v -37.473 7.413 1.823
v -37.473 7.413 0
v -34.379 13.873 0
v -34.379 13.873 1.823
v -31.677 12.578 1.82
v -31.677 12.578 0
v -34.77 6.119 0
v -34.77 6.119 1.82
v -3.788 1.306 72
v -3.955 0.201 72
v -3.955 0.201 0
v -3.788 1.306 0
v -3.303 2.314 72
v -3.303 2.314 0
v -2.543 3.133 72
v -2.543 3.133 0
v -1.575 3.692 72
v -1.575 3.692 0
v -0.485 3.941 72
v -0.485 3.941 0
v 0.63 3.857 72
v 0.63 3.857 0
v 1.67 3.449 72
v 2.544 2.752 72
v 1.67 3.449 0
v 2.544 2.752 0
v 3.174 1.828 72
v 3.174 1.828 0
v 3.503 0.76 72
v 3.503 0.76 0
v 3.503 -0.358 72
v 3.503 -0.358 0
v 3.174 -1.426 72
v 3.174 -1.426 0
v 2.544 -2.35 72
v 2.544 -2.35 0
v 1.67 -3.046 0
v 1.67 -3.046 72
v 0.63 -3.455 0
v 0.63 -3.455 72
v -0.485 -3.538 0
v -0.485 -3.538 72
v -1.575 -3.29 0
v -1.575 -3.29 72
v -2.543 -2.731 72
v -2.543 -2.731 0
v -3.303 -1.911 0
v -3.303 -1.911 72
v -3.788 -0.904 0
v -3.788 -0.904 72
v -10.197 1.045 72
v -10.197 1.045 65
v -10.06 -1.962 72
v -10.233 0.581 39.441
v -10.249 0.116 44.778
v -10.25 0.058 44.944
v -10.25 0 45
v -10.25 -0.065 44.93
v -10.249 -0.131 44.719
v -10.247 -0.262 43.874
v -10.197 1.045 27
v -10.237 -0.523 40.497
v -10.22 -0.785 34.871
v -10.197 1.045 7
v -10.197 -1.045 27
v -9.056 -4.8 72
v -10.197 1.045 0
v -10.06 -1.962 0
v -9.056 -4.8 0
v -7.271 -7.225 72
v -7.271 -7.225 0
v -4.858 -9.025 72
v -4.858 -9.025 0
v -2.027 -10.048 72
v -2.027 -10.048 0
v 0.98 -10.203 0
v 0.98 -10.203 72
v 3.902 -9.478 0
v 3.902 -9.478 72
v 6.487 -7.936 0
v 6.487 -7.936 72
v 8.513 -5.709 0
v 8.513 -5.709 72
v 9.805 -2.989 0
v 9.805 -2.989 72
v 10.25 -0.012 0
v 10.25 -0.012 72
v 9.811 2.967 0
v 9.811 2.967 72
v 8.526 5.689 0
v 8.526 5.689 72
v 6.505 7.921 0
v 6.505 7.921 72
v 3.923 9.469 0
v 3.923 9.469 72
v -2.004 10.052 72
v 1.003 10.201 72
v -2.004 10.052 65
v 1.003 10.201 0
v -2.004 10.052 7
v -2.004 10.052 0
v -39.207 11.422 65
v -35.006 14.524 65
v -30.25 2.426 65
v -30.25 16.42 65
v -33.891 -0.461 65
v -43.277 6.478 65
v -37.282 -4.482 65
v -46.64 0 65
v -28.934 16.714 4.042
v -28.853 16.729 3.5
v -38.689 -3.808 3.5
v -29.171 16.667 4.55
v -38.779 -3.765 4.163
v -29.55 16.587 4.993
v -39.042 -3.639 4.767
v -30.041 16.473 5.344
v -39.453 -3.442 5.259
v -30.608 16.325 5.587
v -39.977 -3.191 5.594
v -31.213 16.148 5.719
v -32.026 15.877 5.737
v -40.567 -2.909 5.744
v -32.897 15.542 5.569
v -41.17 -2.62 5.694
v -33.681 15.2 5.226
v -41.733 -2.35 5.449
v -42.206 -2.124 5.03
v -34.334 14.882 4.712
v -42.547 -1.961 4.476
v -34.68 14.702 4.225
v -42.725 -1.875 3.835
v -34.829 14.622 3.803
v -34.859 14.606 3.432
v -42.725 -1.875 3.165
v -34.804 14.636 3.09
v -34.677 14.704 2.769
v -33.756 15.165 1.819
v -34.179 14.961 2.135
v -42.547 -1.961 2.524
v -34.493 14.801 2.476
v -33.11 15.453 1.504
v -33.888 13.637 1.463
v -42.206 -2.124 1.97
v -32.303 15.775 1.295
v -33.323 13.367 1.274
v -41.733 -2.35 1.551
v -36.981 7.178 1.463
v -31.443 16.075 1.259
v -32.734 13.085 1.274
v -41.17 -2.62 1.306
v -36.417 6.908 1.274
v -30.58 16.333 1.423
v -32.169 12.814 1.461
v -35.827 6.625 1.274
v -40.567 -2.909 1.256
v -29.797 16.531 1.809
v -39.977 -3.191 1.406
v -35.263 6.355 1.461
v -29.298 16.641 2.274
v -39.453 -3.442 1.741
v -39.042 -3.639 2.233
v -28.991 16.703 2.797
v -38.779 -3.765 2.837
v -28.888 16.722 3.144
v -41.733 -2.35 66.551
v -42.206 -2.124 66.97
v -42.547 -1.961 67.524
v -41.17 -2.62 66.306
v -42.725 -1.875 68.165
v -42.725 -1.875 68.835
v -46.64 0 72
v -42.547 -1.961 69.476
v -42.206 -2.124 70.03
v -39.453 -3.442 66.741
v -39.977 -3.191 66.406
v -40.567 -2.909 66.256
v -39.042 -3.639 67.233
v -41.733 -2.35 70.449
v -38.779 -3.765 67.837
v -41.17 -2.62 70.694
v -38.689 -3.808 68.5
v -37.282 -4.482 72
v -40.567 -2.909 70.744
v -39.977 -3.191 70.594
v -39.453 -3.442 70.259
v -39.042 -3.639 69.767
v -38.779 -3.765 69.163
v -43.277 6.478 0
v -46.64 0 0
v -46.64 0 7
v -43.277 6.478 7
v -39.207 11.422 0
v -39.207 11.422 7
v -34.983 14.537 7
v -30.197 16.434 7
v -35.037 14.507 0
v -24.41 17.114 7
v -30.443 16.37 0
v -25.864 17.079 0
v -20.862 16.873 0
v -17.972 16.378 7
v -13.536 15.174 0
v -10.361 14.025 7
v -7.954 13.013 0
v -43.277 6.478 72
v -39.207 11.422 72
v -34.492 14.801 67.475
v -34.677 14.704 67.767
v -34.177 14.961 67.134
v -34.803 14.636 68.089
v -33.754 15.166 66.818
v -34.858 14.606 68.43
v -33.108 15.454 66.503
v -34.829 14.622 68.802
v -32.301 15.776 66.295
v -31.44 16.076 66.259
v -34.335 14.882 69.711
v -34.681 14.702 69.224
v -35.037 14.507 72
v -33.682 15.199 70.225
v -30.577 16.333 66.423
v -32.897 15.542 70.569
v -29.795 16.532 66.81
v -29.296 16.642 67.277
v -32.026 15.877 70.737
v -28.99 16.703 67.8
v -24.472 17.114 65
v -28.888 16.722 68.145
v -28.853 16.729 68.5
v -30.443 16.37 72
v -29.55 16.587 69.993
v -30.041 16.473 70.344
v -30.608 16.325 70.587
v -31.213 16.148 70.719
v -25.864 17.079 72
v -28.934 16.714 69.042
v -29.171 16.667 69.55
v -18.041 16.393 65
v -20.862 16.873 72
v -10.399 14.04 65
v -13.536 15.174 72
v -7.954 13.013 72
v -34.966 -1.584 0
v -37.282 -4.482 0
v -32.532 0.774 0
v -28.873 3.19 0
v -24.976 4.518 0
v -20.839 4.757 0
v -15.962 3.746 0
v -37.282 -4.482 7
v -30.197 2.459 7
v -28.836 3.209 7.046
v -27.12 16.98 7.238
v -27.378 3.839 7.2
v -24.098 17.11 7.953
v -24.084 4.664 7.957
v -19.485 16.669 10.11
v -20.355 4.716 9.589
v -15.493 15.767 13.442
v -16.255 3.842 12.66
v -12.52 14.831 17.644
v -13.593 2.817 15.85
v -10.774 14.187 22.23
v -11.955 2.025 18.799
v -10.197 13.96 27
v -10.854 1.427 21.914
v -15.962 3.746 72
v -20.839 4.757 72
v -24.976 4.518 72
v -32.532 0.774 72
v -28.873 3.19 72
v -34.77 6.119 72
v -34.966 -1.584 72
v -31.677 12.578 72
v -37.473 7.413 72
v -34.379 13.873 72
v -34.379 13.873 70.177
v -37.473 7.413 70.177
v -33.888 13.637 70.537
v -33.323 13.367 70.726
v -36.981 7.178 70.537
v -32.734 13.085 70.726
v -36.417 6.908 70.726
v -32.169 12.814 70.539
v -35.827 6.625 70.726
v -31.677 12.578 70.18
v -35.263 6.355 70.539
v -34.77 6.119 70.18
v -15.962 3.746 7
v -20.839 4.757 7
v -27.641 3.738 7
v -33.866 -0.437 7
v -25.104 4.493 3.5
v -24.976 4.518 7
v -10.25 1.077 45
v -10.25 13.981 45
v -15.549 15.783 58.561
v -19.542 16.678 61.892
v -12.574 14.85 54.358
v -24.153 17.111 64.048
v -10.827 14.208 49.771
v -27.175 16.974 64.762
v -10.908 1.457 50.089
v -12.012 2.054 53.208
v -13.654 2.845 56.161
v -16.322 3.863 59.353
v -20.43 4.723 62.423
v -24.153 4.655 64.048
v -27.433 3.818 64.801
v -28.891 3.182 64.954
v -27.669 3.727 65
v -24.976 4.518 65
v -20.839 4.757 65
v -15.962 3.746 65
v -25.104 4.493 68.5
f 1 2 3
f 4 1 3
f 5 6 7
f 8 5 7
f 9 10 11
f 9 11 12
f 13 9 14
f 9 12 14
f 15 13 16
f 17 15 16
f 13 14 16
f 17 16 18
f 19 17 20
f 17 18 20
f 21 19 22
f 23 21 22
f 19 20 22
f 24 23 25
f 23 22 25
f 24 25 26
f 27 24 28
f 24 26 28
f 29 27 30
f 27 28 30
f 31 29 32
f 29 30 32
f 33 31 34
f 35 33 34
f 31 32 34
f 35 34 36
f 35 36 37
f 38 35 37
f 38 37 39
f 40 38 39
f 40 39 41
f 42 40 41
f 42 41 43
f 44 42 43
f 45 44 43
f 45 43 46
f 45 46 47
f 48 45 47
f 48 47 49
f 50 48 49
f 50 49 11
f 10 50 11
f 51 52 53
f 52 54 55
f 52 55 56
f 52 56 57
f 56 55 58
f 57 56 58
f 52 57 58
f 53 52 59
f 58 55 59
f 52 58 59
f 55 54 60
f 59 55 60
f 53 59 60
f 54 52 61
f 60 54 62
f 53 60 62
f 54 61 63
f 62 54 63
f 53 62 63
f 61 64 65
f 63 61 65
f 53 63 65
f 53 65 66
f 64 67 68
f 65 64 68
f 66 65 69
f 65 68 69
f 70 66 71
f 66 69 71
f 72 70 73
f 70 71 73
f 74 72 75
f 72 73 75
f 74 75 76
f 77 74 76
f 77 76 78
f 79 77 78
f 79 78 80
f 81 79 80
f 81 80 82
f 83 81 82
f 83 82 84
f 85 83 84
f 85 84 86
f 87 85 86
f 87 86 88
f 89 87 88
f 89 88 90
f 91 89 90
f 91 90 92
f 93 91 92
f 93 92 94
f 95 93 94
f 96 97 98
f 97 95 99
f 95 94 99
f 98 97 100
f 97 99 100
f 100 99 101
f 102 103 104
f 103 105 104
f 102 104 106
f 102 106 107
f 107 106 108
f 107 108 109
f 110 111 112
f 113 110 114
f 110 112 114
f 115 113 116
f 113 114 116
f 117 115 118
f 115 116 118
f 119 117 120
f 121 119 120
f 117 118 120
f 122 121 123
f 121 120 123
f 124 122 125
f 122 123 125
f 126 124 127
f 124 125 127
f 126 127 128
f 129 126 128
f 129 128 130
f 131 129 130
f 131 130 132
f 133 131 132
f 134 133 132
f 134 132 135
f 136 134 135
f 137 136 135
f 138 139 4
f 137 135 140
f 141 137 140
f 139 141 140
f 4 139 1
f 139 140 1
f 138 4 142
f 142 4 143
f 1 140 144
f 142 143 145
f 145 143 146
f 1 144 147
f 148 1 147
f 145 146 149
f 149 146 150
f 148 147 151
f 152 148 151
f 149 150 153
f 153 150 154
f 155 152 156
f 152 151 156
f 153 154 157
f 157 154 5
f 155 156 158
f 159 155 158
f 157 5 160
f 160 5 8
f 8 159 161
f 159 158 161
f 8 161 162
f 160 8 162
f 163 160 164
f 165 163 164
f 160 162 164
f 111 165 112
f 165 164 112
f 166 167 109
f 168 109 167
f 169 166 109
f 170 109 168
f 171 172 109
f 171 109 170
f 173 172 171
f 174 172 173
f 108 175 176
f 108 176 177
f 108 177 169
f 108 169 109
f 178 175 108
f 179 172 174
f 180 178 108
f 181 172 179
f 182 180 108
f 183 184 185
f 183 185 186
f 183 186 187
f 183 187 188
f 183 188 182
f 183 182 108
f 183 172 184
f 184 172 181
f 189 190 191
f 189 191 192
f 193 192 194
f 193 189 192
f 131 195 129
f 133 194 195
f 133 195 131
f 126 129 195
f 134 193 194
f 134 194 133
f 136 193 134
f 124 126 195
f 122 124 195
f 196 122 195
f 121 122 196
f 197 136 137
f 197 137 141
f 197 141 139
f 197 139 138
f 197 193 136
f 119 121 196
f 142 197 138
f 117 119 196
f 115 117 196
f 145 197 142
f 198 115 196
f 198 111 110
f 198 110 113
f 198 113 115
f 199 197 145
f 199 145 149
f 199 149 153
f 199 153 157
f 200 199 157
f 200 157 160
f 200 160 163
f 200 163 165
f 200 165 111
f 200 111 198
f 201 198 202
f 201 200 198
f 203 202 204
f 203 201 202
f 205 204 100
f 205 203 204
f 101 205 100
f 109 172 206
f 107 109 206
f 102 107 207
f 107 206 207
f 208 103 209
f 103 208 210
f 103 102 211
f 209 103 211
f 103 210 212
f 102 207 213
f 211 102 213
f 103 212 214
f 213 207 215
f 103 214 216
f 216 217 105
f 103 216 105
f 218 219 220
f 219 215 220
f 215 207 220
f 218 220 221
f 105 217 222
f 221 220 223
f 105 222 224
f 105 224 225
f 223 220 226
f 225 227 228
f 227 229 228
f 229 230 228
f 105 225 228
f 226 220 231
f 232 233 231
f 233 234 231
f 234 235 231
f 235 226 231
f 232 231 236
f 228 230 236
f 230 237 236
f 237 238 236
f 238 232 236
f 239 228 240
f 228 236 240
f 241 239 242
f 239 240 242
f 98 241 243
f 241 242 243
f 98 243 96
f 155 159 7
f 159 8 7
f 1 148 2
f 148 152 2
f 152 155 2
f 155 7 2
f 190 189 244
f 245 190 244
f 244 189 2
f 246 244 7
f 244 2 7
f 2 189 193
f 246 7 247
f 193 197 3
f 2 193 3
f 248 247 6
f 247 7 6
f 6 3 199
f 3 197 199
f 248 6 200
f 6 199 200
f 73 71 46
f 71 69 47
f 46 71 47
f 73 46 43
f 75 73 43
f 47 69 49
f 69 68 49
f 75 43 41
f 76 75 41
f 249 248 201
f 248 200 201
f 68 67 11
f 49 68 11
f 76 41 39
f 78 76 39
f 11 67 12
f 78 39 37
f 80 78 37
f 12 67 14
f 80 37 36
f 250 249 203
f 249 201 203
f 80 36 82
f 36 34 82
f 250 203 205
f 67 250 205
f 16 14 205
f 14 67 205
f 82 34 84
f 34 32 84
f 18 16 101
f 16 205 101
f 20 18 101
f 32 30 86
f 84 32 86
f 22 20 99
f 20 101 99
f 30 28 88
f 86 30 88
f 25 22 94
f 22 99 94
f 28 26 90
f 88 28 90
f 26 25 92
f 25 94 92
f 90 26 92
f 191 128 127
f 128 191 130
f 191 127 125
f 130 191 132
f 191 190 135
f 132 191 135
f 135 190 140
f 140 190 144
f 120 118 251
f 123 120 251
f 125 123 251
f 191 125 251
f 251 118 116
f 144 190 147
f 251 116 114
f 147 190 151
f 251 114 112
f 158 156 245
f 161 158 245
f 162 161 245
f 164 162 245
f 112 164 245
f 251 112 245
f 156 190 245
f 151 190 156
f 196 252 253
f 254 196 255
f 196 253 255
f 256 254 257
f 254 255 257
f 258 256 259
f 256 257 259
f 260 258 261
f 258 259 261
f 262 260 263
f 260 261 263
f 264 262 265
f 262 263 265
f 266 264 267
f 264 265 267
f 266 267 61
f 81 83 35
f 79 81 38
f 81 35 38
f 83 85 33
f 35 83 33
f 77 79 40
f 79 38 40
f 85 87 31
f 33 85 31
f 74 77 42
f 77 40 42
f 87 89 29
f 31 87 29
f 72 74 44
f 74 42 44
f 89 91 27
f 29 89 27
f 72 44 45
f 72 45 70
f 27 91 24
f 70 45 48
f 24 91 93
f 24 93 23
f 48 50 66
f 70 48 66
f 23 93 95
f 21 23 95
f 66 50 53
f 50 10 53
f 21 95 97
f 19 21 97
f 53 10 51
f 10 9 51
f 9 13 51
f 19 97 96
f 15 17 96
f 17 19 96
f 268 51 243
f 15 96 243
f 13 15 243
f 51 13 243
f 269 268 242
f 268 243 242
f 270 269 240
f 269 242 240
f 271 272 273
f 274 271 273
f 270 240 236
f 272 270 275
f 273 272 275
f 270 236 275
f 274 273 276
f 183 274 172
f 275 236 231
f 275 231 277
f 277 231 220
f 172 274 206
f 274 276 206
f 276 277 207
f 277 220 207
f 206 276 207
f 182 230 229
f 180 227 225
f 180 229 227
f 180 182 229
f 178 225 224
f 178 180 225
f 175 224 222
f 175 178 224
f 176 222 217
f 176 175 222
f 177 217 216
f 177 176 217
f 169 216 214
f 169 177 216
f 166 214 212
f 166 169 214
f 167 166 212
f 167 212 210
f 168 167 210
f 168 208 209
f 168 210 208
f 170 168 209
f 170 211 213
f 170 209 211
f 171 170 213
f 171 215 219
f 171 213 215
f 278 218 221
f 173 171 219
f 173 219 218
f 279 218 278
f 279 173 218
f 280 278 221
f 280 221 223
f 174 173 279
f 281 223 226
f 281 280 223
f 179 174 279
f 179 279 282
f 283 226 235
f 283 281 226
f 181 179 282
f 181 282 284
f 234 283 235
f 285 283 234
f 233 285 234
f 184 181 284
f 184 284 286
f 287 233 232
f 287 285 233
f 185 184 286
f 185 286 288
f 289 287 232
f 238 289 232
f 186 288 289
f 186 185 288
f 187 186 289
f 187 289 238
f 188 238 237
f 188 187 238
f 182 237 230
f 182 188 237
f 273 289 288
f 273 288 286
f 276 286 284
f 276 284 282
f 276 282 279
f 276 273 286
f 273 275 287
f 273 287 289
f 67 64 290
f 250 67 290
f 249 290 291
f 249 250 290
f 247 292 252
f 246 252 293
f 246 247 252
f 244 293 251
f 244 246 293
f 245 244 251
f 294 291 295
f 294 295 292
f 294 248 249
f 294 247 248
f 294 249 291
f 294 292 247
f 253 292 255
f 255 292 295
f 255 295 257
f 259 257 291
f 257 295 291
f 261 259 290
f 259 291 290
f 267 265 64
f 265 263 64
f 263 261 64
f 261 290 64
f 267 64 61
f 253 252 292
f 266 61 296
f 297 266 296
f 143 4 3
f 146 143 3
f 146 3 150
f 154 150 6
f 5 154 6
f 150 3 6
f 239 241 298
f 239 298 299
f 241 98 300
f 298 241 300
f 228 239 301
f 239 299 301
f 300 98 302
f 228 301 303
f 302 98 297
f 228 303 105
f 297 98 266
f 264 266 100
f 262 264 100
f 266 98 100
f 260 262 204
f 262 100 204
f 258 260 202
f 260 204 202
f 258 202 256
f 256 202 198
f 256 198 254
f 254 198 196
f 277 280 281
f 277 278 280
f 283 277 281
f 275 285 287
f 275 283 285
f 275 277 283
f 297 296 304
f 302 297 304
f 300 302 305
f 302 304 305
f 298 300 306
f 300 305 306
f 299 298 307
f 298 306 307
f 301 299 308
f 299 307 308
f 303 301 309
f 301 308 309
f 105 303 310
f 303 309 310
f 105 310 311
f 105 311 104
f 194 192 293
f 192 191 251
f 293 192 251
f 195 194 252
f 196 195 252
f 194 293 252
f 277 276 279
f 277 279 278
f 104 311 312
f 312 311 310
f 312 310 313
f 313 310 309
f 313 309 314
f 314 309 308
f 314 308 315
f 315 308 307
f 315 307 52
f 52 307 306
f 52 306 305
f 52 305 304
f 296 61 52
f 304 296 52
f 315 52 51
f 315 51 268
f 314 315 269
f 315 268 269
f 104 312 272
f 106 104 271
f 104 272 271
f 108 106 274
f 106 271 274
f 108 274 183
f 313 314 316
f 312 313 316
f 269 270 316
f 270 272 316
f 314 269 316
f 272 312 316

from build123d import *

# Parameters (mm, degrees)
SKETCH1_R                = 10.25
BOSS_EXTRUDE1_DEPTH      = 7
SKETCH2_R                = 3.75
CUT_EXTRUDE1_DEPTH       = 2
BOSS_EXTRUDE3_START      = -7
BOSS_EXTRUDE3_DEPTH      = 7
SKETCH11_R               = 2.25
CUT_EXTRUDE3_DEPTH       = 30
CUT_EXTRUDE4_DEPTH       = 3
SKETCH15_R               = 10.25
BOSS_EXTRUDE4_DEPTH      = 65
BOSS_EXTRUDE5_DEPTH      = 58
CUT_EXTRUDE5_DEPTH       = 44
CUT_EXTRUDE5_DEPTH_BACK  = 34
BOSS_EXTRUDE6_DEPTH      = 15
BOSS_EXTRUDE6_DEPTH_BACK = 20
SKETCH20_R               = 10.25
SKETCH21_R               = 3.75
CUT_EXTRUDE6_DEPTH       = 92


with BuildPart() as part:
    # Sketch1 → Boss-Extrude1 (new body)
    with BuildSketch(Plane.XY):
        Circle(SKETCH1_R)
    extrude(amount=BOSS_EXTRUDE1_DEPTH)

    # Sketch2 → Cut-Extrude1 (cut)
    with BuildSketch(Plane(origin=(0, 0, 0), x_dir=(-1, 0, 0), z_dir=(0, 0, -1))):
        with Locations((0.204827132, 0.201115052)):
            Circle(SKETCH2_R)
    cut_extrude1 = extrude(amount=-CUT_EXTRUDE1_DEPTH, mode=Mode.SUBTRACT)

    # Sketch4 → Boss-Extrude3 (add)
    with BuildSketch(Plane.XY.offset(7).offset(BOSS_EXTRUDE3_START)):
        with BuildLine():
            add(Edge.make_bspline(
                [(-46.64048221, 0), (-34.962013149, 28.10744238), (-2.004119339, 10.052164228)],
                knots=[0, 0, 0, 1, 1, 1], degree=2))
            Line((-46.64048221, 0), (-37.28232369, -4.481971191))
            add(Edge.make_bspline(
                [(-10.196546661, 1.045435881), (-26.46828973, 10.703347347), (-37.28232369, -4.481971191)],
                knots=[0, 0, 0, 1, 1, 1], degree=2))
            ThreePointArc((-10.196546661, 1.045435881), (-7.58250299, 6.896966609), (-2.004119339, 10.052164228))
        make_face()
    boss_extrude3 = extrude(amount=BOSS_EXTRUDE3_DEPTH)

    # Sketch11 → Cut-Extrude3 (cut)
    with BuildSketch(Plane(origin=(-8.702296632, -18.170012234, 0), x_dir=(0, 0, 1), z_dir=(-0.4319519366403788, -0.9018966262452843, 0))):
        with Locations(Location((3.5, 35.498805819, 0), (0, 0, 270))):
            Circle(SKETCH11_R)
    cut_extrude3 = extrude(amount=-CUT_EXTRUDE3_DEPTH, mode=Mode.SUBTRACT)

    # Sketch13 → Cut-Extrude4 (cut)
    with BuildSketch(Plane(origin=(0, 0, 0), x_dir=(-1, 0, 0), z_dir=(0, 0, -1))):
        Polygon((34.379239122, 13.872575937), (31.676706965, 12.578232477), (34.770203183, 6.119148571), (37.47273534, 7.41349203), align=None)
    cut_extrude4 = extrude(amount=-CUT_EXTRUDE4_DEPTH, mode=Mode.SUBTRACT)

    # Sketch15 → Boss-Extrude4 (add)
    with BuildSketch(Plane.XY.offset(7)):
        with Locations(Location((0, 0, 0), (0, 0, 174.146009255))):
            Circle(SKETCH15_R)
    extrude(amount=BOSS_EXTRUDE4_DEPTH)

    # Mirror1: Cut-Extrude1, Boss-Extrude3, Cut-Extrude3, Cut-Extrude4 across plane
    add(cut_extrude1.mirror(Plane.XY.offset(36)), mode=Mode.SUBTRACT)
    add(boss_extrude3.mirror(Plane.XY.offset(36)))
    add(cut_extrude3.mirror(Plane.XY.offset(36)), mode=Mode.SUBTRACT)
    add(cut_extrude4.mirror(Plane.XY.offset(36)), mode=Mode.SUBTRACT)

    # Sketch18 → Boss-Extrude5 (add)
    with BuildSketch(Plane.XY.offset(7)):
        with BuildLine():
            Line((-46.64048221, 0), (-37.28232368, -4.481971176))
            add(Edge.make_bspline(
                [(-37.28232368, -4.481971176), (-26.468289723, 10.703347342), (-10.196546661, 1.045435881)],
                knots=[0, 0, 0, 1, 1, 1], degree=2))
            ThreePointArc((-10.196546661, 1.045435881), (-7.58250299, 6.896966609), (-2.004119339, 10.052164228))
            add(Edge.make_bspline(
                [(-2.004119339, 10.052164228), (-34.962013149, 28.10744238), (-46.64048221, 0)],
                knots=[0, 0, 0, 1, 1, 1], degree=2))
        make_face()
    extrude(amount=BOSS_EXTRUDE5_DEPTH)

    # Sketch19 → Cut-Extrude5 (cut, two sides: drawn at the far end of the back side and taken through both)
    with BuildSketch(Plane(origin=(0, 0, 0), x_dir=(1, 0, 0), z_dir=(0, 1, 0)).offset(-CUT_EXTRUDE5_DEPTH_BACK)):
        with BuildLine():
            Line((-56.84662667, -7), (-30.196546661, -7))
            ThreePointArc((-30.196546661, -7), (-16.054411038, -12.857864376), (-10.196546661, -27))
            Line((-10.196546661, -27), (-10.25, -45))
            ThreePointArc((-10.25, -45), (-16.107864376, -59.142135624), (-30.25, -65))
            Line((-30.25, -65), (-56.84662667, -65))
            Line((-56.84662667, -65), (-56.84662667, -7))
        make_face()
    extrude(amount=CUT_EXTRUDE5_DEPTH + CUT_EXTRUDE5_DEPTH_BACK, mode=Mode.SUBTRACT)

    # Sketch20 → Boss-Extrude6 (add, two sides: drawn at the far end of the back side and taken through both)
    with BuildSketch(Plane.XY.offset(36).offset(-BOSS_EXTRUDE6_DEPTH_BACK)):
        Circle(SKETCH20_R)
    extrude(amount=BOSS_EXTRUDE6_DEPTH + BOSS_EXTRUDE6_DEPTH_BACK)

    # Sketch21 → Cut-Extrude6 (cut)
    with BuildSketch(Plane.XY.offset(70)):
        with Locations(Location((-0.204827132, 0.201115052, 0), (0, 0, 180))):
            Circle(SKETCH21_R)
    extrude(amount=-CUT_EXTRUDE6_DEPTH, mode=Mode.SUBTRACT)


solid = part.part
